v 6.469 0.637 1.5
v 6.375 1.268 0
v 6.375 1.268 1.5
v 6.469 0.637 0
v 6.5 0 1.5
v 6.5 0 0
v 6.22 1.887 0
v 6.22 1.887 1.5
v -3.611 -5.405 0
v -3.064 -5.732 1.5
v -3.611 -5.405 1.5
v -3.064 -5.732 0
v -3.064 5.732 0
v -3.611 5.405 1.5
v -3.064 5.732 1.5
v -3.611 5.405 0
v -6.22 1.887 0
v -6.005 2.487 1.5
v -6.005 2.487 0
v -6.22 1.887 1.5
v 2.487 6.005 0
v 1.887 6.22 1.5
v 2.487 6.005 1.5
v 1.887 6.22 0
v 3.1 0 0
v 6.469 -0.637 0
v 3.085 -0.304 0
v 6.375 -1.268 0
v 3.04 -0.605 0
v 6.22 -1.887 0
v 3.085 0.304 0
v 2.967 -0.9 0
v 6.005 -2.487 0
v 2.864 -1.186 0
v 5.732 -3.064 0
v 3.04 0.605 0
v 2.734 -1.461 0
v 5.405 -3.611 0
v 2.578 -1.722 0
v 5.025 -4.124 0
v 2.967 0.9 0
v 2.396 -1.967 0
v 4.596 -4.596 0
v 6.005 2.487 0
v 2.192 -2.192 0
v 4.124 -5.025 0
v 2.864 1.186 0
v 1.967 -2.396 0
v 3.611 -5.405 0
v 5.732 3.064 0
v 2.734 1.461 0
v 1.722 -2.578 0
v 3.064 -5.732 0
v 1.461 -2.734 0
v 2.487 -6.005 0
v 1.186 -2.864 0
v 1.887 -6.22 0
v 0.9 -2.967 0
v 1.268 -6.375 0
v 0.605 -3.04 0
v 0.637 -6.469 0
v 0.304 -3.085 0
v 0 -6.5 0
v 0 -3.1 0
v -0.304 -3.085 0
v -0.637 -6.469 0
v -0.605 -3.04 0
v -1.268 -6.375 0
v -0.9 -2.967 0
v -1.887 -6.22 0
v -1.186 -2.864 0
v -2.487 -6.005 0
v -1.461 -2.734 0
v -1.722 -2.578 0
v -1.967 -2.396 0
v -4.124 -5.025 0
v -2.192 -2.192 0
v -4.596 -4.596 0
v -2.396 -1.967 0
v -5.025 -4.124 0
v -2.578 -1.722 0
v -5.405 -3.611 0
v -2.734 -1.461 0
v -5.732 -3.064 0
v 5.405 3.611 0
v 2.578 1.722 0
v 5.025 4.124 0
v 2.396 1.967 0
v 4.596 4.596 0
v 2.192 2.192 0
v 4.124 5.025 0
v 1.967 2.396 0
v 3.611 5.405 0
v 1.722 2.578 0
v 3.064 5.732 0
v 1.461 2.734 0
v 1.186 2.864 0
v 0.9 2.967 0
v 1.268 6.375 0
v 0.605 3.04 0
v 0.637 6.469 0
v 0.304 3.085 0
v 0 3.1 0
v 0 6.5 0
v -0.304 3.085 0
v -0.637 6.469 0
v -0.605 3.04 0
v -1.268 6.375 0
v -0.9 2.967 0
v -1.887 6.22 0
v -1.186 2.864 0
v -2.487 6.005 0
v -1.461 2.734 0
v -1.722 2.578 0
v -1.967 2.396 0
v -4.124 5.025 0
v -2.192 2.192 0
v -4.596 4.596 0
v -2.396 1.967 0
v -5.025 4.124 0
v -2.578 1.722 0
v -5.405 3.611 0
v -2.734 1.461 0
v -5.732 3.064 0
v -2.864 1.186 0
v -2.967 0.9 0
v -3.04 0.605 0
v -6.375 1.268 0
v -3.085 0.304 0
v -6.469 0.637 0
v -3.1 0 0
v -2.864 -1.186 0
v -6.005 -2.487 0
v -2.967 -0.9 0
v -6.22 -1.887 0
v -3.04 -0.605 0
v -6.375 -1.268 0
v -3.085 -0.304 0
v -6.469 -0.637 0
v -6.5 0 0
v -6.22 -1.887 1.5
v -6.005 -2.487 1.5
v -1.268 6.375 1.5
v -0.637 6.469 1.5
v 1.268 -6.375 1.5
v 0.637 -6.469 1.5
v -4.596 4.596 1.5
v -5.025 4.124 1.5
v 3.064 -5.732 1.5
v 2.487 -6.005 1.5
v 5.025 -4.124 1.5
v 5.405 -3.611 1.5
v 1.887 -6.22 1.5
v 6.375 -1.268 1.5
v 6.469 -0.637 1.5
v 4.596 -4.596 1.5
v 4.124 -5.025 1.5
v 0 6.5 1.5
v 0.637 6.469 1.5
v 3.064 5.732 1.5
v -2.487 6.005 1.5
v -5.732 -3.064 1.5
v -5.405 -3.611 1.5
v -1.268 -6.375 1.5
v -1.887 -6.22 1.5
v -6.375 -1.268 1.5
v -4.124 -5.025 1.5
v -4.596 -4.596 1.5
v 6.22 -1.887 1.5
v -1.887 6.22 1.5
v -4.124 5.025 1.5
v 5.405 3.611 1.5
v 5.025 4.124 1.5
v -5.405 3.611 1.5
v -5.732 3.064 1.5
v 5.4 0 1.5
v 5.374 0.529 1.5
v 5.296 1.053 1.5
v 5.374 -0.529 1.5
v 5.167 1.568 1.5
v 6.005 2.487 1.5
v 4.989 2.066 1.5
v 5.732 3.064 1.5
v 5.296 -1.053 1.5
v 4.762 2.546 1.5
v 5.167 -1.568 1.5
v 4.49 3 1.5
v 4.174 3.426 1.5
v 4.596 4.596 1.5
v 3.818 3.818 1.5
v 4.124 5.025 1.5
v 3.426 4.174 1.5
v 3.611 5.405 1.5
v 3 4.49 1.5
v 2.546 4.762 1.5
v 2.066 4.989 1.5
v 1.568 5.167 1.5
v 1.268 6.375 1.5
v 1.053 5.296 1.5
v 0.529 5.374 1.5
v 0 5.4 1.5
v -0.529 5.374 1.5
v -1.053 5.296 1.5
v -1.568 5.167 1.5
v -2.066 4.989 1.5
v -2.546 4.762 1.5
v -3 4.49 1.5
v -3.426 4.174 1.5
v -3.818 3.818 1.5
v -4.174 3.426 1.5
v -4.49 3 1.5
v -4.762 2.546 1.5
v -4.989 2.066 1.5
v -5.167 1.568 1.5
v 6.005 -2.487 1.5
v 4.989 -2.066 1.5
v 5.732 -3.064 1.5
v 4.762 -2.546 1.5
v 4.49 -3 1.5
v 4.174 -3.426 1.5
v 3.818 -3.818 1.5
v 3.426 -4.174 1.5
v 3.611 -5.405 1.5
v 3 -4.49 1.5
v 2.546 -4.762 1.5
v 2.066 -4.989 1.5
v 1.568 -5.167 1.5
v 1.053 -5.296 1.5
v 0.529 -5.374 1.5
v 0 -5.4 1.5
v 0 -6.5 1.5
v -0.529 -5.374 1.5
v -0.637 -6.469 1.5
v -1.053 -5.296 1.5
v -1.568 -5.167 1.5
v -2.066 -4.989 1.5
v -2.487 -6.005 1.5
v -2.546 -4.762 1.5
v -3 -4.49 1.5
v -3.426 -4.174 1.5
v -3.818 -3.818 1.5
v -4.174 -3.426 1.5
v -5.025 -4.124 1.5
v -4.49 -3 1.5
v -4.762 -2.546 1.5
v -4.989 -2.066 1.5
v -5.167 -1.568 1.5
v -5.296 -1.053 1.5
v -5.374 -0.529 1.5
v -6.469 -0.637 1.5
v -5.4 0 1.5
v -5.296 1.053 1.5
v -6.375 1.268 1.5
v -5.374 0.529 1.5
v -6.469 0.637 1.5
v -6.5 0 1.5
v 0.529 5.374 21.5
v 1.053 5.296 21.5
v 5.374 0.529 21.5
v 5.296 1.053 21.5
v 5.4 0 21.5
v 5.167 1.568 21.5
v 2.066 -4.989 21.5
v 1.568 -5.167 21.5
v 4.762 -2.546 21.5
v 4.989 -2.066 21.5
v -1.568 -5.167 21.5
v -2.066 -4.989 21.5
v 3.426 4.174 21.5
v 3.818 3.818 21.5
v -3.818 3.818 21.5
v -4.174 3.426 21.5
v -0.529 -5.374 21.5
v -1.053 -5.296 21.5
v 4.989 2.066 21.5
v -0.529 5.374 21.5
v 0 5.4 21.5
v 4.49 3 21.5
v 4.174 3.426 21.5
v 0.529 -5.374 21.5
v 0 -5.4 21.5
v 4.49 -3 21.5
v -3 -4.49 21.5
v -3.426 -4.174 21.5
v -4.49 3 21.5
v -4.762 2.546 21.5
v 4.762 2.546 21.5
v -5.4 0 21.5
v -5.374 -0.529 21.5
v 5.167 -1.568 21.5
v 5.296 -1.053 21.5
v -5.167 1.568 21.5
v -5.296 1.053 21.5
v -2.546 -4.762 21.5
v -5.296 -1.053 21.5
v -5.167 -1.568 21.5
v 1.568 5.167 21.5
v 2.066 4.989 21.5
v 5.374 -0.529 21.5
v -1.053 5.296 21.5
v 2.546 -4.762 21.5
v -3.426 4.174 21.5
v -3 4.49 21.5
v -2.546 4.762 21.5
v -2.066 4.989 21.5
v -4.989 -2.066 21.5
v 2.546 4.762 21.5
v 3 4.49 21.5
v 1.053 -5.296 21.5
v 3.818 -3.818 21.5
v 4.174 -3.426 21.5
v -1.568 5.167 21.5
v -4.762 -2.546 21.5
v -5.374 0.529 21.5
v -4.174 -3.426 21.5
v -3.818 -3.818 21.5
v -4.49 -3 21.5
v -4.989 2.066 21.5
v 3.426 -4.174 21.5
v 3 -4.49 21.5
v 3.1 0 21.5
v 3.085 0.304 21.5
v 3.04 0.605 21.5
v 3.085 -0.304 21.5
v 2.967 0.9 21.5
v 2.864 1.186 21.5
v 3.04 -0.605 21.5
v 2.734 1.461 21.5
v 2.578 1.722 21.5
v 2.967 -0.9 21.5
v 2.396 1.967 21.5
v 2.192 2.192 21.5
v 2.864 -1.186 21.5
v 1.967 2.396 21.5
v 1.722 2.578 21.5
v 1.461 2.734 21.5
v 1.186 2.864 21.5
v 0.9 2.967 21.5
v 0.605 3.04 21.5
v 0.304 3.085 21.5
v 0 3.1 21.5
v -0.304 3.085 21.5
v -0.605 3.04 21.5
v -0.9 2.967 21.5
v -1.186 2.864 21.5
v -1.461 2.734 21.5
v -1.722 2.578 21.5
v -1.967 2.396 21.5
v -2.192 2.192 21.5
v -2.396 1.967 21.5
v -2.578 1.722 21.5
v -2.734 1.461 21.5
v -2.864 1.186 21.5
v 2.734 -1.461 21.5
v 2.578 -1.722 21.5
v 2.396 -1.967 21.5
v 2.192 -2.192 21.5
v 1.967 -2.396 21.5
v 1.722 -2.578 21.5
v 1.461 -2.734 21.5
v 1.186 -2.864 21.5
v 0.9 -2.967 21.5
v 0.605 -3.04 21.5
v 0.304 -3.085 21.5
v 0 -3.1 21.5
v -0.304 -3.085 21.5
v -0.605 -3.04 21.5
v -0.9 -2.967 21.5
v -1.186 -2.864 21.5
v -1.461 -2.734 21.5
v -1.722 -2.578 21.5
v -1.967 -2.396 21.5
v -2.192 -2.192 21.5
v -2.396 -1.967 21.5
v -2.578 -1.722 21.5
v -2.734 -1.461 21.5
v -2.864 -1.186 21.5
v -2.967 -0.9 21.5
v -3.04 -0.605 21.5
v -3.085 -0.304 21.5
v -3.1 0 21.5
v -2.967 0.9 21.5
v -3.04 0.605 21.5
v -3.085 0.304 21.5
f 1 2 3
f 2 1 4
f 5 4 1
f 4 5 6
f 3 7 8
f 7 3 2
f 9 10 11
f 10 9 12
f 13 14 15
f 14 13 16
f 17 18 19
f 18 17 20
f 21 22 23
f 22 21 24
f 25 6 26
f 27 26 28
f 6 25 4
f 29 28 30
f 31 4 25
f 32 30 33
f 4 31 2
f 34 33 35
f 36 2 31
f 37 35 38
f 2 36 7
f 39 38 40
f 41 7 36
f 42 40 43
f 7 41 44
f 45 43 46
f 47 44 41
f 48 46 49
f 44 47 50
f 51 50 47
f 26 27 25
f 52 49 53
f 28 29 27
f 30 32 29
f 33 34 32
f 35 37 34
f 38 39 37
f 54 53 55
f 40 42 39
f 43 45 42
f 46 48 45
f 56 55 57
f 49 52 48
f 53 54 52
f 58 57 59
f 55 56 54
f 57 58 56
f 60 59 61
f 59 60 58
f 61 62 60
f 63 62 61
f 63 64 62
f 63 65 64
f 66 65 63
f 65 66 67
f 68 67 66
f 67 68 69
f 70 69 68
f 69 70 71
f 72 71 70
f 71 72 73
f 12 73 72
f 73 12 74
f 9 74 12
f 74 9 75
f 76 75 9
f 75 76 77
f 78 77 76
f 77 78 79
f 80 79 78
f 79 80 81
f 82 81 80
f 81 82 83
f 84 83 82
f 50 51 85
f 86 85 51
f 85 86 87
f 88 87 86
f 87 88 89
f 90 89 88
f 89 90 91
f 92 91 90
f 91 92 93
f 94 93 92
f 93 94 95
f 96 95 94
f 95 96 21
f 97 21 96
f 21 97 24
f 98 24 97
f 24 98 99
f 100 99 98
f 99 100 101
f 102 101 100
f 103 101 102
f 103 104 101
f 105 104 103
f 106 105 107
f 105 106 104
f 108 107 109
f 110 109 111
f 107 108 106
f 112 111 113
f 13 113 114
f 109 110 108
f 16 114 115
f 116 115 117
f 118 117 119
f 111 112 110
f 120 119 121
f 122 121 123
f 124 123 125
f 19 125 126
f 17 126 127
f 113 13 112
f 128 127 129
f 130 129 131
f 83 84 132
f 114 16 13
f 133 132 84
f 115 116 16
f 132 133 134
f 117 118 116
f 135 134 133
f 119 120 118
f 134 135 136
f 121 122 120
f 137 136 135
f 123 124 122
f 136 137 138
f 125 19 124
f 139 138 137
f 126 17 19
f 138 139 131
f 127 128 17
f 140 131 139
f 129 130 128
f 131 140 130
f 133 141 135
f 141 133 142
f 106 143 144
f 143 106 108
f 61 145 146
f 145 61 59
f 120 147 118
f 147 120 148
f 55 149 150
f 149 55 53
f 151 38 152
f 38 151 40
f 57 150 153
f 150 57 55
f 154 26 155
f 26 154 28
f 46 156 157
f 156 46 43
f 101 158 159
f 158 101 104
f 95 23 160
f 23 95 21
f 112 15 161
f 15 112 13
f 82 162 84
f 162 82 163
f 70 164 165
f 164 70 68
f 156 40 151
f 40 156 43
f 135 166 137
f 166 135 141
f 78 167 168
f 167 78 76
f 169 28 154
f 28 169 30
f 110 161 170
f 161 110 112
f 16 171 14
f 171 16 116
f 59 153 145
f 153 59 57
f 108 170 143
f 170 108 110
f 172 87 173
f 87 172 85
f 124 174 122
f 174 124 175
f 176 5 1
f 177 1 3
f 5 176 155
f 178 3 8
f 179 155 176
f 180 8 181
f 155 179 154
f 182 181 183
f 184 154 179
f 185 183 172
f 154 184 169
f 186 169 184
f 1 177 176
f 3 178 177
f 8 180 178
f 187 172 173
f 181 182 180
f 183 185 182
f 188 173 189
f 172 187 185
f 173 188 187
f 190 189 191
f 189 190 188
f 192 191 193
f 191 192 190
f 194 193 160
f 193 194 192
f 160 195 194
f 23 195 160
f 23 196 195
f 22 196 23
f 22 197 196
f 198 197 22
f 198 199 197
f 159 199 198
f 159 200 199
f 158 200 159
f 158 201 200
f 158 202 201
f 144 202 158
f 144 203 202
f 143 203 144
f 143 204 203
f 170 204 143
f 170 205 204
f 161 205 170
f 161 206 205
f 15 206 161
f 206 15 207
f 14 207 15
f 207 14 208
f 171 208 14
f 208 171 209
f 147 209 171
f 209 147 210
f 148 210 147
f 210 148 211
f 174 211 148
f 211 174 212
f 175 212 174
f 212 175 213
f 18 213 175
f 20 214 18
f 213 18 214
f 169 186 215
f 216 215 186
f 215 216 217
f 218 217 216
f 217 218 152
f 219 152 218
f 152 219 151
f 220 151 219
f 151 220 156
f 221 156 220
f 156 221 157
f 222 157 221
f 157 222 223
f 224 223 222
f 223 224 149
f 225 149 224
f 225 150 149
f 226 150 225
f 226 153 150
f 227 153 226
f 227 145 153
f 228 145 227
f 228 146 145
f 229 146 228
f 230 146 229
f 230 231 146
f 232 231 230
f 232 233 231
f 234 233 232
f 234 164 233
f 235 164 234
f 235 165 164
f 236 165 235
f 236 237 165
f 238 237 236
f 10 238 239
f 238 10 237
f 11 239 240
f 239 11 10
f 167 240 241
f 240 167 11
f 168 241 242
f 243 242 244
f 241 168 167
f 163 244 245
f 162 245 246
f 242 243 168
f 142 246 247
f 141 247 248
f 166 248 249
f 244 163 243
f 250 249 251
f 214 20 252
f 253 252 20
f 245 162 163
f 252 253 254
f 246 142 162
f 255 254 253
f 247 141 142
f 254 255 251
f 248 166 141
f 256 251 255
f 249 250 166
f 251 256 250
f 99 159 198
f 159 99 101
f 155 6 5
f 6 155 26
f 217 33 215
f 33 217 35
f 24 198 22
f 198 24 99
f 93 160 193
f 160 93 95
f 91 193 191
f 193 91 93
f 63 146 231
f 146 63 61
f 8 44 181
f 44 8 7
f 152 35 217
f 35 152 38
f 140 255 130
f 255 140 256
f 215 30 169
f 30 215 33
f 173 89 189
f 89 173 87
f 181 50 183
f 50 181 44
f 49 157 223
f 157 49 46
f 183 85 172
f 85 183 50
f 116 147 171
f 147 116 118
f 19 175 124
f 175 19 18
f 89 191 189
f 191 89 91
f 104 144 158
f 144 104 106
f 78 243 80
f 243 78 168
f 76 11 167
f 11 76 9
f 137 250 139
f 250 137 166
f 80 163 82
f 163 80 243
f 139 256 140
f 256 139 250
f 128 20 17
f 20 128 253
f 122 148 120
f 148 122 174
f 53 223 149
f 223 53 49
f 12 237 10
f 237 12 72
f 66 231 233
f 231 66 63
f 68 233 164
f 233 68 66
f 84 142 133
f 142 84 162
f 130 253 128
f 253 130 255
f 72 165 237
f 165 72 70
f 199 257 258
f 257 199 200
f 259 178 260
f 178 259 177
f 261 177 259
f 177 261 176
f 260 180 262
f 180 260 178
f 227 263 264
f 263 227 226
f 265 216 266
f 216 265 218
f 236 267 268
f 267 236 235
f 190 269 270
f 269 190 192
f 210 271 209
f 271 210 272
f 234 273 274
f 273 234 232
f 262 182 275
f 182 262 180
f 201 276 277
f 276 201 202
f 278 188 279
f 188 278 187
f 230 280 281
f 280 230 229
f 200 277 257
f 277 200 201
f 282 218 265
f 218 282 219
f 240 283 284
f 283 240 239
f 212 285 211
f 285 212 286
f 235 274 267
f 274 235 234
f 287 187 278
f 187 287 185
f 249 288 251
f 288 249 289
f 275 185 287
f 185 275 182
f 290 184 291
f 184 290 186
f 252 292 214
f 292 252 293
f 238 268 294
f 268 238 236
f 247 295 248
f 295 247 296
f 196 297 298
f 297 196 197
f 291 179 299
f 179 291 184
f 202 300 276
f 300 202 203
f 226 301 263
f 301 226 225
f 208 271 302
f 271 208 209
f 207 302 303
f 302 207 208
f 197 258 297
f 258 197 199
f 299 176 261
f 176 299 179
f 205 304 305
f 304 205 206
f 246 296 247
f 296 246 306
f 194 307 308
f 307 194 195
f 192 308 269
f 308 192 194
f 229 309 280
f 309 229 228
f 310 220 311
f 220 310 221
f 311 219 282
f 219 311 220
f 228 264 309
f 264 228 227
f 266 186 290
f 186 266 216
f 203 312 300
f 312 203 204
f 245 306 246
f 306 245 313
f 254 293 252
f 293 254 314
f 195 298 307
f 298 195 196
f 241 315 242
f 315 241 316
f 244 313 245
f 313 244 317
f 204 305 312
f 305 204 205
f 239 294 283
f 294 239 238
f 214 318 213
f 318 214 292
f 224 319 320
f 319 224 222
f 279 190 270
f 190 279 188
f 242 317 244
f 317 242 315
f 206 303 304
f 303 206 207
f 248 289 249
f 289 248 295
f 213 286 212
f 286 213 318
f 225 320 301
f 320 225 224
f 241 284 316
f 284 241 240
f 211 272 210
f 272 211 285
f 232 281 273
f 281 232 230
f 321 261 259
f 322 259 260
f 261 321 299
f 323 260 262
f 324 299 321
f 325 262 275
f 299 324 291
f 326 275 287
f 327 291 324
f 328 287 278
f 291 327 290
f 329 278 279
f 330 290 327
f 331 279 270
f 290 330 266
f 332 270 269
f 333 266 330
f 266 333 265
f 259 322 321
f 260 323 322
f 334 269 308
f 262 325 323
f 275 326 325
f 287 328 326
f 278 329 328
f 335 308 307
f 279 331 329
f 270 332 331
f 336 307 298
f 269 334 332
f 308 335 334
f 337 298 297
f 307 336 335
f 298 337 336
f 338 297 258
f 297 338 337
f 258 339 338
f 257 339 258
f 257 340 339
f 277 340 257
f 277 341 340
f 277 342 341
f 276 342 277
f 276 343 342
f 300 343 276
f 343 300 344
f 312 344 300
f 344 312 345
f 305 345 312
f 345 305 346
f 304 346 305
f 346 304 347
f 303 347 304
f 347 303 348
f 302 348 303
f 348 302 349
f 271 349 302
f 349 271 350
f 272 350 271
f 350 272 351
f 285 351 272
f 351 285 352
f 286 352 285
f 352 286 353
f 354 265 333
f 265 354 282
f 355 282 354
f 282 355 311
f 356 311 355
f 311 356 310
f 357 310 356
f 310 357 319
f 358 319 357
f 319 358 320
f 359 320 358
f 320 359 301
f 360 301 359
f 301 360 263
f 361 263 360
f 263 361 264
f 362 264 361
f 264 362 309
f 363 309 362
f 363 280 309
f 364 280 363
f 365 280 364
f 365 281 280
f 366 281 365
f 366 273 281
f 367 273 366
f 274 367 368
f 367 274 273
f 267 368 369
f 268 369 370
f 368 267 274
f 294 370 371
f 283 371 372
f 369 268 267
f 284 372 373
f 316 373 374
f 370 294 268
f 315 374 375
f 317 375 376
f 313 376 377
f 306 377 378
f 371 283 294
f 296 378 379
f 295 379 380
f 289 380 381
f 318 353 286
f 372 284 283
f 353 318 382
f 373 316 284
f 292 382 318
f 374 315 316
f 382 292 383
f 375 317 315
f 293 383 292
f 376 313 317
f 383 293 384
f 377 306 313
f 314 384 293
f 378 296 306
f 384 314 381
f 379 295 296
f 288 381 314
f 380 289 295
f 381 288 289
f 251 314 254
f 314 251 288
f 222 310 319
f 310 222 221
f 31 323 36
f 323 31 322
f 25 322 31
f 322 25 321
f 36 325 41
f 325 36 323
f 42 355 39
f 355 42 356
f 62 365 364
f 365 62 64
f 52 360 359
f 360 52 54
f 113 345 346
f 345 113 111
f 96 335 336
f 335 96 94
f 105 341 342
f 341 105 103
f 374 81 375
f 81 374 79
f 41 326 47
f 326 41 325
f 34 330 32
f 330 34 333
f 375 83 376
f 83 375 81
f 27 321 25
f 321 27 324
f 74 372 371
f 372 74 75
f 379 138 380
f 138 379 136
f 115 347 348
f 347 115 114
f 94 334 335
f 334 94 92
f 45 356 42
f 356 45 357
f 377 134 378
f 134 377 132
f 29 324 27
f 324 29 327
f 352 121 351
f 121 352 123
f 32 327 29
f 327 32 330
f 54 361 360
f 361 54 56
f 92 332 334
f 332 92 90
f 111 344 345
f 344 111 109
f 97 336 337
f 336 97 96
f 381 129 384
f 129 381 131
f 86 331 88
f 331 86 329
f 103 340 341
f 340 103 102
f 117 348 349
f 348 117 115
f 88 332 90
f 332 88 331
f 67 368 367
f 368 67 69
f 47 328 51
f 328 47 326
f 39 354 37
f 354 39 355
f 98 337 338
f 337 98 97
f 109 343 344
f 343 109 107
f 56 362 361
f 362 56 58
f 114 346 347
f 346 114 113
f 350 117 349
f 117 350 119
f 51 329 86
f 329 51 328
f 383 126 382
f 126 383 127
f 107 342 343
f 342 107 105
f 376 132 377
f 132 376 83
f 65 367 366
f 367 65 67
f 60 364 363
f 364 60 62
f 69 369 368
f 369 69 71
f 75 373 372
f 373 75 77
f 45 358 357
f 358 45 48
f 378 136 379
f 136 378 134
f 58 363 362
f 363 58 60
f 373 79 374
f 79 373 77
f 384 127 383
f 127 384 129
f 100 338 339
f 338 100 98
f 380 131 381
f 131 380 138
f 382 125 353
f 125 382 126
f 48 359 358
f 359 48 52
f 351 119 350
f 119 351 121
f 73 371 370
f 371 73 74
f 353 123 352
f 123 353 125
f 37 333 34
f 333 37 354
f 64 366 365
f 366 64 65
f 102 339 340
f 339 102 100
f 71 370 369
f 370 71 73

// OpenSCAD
// Adapter sleeve for 0.2 mL PCR tubes in 1.5 mL rack holes
// Designed to be printed upside down (collar on the bed)

collar_d = 13.0;      // Diameter of the base collar
collar_t = 1.5;       // Thickness of the base collar
sleeve_d = 10.8;      // Outer diameter of the sleeve body
total_h  = 21.5;      // Total height from bed to top of sleeve
bore_d   = 6.2;       // Diameter of the central bore

$fn = 64;

// The part is built from z=0 upwards.
// The collar is the base (z=0 to 1.5).
// The sleeve body rises from the collar (z=1.5 to 21.5).

difference() {
    // Main Body
    union() {
        // The Collar (Base)
        cylinder(h = collar_t, d = collar_d);
        
        // The Sleeve Body
        // It starts at z = collar_t and goes to total_h
        translate([0, 0, collar_t])
            cylinder(h = total_h - collar_t, d = sleeve_d);
    }

    // The Bore
    // Runs through the full height, open at both ends.
    // We extend the cylinder slightly beyond the height to ensure a clean cut.
    translate([0, 0, -1])
        cylinder(h = total_h + 2, d = bore_d);
}
